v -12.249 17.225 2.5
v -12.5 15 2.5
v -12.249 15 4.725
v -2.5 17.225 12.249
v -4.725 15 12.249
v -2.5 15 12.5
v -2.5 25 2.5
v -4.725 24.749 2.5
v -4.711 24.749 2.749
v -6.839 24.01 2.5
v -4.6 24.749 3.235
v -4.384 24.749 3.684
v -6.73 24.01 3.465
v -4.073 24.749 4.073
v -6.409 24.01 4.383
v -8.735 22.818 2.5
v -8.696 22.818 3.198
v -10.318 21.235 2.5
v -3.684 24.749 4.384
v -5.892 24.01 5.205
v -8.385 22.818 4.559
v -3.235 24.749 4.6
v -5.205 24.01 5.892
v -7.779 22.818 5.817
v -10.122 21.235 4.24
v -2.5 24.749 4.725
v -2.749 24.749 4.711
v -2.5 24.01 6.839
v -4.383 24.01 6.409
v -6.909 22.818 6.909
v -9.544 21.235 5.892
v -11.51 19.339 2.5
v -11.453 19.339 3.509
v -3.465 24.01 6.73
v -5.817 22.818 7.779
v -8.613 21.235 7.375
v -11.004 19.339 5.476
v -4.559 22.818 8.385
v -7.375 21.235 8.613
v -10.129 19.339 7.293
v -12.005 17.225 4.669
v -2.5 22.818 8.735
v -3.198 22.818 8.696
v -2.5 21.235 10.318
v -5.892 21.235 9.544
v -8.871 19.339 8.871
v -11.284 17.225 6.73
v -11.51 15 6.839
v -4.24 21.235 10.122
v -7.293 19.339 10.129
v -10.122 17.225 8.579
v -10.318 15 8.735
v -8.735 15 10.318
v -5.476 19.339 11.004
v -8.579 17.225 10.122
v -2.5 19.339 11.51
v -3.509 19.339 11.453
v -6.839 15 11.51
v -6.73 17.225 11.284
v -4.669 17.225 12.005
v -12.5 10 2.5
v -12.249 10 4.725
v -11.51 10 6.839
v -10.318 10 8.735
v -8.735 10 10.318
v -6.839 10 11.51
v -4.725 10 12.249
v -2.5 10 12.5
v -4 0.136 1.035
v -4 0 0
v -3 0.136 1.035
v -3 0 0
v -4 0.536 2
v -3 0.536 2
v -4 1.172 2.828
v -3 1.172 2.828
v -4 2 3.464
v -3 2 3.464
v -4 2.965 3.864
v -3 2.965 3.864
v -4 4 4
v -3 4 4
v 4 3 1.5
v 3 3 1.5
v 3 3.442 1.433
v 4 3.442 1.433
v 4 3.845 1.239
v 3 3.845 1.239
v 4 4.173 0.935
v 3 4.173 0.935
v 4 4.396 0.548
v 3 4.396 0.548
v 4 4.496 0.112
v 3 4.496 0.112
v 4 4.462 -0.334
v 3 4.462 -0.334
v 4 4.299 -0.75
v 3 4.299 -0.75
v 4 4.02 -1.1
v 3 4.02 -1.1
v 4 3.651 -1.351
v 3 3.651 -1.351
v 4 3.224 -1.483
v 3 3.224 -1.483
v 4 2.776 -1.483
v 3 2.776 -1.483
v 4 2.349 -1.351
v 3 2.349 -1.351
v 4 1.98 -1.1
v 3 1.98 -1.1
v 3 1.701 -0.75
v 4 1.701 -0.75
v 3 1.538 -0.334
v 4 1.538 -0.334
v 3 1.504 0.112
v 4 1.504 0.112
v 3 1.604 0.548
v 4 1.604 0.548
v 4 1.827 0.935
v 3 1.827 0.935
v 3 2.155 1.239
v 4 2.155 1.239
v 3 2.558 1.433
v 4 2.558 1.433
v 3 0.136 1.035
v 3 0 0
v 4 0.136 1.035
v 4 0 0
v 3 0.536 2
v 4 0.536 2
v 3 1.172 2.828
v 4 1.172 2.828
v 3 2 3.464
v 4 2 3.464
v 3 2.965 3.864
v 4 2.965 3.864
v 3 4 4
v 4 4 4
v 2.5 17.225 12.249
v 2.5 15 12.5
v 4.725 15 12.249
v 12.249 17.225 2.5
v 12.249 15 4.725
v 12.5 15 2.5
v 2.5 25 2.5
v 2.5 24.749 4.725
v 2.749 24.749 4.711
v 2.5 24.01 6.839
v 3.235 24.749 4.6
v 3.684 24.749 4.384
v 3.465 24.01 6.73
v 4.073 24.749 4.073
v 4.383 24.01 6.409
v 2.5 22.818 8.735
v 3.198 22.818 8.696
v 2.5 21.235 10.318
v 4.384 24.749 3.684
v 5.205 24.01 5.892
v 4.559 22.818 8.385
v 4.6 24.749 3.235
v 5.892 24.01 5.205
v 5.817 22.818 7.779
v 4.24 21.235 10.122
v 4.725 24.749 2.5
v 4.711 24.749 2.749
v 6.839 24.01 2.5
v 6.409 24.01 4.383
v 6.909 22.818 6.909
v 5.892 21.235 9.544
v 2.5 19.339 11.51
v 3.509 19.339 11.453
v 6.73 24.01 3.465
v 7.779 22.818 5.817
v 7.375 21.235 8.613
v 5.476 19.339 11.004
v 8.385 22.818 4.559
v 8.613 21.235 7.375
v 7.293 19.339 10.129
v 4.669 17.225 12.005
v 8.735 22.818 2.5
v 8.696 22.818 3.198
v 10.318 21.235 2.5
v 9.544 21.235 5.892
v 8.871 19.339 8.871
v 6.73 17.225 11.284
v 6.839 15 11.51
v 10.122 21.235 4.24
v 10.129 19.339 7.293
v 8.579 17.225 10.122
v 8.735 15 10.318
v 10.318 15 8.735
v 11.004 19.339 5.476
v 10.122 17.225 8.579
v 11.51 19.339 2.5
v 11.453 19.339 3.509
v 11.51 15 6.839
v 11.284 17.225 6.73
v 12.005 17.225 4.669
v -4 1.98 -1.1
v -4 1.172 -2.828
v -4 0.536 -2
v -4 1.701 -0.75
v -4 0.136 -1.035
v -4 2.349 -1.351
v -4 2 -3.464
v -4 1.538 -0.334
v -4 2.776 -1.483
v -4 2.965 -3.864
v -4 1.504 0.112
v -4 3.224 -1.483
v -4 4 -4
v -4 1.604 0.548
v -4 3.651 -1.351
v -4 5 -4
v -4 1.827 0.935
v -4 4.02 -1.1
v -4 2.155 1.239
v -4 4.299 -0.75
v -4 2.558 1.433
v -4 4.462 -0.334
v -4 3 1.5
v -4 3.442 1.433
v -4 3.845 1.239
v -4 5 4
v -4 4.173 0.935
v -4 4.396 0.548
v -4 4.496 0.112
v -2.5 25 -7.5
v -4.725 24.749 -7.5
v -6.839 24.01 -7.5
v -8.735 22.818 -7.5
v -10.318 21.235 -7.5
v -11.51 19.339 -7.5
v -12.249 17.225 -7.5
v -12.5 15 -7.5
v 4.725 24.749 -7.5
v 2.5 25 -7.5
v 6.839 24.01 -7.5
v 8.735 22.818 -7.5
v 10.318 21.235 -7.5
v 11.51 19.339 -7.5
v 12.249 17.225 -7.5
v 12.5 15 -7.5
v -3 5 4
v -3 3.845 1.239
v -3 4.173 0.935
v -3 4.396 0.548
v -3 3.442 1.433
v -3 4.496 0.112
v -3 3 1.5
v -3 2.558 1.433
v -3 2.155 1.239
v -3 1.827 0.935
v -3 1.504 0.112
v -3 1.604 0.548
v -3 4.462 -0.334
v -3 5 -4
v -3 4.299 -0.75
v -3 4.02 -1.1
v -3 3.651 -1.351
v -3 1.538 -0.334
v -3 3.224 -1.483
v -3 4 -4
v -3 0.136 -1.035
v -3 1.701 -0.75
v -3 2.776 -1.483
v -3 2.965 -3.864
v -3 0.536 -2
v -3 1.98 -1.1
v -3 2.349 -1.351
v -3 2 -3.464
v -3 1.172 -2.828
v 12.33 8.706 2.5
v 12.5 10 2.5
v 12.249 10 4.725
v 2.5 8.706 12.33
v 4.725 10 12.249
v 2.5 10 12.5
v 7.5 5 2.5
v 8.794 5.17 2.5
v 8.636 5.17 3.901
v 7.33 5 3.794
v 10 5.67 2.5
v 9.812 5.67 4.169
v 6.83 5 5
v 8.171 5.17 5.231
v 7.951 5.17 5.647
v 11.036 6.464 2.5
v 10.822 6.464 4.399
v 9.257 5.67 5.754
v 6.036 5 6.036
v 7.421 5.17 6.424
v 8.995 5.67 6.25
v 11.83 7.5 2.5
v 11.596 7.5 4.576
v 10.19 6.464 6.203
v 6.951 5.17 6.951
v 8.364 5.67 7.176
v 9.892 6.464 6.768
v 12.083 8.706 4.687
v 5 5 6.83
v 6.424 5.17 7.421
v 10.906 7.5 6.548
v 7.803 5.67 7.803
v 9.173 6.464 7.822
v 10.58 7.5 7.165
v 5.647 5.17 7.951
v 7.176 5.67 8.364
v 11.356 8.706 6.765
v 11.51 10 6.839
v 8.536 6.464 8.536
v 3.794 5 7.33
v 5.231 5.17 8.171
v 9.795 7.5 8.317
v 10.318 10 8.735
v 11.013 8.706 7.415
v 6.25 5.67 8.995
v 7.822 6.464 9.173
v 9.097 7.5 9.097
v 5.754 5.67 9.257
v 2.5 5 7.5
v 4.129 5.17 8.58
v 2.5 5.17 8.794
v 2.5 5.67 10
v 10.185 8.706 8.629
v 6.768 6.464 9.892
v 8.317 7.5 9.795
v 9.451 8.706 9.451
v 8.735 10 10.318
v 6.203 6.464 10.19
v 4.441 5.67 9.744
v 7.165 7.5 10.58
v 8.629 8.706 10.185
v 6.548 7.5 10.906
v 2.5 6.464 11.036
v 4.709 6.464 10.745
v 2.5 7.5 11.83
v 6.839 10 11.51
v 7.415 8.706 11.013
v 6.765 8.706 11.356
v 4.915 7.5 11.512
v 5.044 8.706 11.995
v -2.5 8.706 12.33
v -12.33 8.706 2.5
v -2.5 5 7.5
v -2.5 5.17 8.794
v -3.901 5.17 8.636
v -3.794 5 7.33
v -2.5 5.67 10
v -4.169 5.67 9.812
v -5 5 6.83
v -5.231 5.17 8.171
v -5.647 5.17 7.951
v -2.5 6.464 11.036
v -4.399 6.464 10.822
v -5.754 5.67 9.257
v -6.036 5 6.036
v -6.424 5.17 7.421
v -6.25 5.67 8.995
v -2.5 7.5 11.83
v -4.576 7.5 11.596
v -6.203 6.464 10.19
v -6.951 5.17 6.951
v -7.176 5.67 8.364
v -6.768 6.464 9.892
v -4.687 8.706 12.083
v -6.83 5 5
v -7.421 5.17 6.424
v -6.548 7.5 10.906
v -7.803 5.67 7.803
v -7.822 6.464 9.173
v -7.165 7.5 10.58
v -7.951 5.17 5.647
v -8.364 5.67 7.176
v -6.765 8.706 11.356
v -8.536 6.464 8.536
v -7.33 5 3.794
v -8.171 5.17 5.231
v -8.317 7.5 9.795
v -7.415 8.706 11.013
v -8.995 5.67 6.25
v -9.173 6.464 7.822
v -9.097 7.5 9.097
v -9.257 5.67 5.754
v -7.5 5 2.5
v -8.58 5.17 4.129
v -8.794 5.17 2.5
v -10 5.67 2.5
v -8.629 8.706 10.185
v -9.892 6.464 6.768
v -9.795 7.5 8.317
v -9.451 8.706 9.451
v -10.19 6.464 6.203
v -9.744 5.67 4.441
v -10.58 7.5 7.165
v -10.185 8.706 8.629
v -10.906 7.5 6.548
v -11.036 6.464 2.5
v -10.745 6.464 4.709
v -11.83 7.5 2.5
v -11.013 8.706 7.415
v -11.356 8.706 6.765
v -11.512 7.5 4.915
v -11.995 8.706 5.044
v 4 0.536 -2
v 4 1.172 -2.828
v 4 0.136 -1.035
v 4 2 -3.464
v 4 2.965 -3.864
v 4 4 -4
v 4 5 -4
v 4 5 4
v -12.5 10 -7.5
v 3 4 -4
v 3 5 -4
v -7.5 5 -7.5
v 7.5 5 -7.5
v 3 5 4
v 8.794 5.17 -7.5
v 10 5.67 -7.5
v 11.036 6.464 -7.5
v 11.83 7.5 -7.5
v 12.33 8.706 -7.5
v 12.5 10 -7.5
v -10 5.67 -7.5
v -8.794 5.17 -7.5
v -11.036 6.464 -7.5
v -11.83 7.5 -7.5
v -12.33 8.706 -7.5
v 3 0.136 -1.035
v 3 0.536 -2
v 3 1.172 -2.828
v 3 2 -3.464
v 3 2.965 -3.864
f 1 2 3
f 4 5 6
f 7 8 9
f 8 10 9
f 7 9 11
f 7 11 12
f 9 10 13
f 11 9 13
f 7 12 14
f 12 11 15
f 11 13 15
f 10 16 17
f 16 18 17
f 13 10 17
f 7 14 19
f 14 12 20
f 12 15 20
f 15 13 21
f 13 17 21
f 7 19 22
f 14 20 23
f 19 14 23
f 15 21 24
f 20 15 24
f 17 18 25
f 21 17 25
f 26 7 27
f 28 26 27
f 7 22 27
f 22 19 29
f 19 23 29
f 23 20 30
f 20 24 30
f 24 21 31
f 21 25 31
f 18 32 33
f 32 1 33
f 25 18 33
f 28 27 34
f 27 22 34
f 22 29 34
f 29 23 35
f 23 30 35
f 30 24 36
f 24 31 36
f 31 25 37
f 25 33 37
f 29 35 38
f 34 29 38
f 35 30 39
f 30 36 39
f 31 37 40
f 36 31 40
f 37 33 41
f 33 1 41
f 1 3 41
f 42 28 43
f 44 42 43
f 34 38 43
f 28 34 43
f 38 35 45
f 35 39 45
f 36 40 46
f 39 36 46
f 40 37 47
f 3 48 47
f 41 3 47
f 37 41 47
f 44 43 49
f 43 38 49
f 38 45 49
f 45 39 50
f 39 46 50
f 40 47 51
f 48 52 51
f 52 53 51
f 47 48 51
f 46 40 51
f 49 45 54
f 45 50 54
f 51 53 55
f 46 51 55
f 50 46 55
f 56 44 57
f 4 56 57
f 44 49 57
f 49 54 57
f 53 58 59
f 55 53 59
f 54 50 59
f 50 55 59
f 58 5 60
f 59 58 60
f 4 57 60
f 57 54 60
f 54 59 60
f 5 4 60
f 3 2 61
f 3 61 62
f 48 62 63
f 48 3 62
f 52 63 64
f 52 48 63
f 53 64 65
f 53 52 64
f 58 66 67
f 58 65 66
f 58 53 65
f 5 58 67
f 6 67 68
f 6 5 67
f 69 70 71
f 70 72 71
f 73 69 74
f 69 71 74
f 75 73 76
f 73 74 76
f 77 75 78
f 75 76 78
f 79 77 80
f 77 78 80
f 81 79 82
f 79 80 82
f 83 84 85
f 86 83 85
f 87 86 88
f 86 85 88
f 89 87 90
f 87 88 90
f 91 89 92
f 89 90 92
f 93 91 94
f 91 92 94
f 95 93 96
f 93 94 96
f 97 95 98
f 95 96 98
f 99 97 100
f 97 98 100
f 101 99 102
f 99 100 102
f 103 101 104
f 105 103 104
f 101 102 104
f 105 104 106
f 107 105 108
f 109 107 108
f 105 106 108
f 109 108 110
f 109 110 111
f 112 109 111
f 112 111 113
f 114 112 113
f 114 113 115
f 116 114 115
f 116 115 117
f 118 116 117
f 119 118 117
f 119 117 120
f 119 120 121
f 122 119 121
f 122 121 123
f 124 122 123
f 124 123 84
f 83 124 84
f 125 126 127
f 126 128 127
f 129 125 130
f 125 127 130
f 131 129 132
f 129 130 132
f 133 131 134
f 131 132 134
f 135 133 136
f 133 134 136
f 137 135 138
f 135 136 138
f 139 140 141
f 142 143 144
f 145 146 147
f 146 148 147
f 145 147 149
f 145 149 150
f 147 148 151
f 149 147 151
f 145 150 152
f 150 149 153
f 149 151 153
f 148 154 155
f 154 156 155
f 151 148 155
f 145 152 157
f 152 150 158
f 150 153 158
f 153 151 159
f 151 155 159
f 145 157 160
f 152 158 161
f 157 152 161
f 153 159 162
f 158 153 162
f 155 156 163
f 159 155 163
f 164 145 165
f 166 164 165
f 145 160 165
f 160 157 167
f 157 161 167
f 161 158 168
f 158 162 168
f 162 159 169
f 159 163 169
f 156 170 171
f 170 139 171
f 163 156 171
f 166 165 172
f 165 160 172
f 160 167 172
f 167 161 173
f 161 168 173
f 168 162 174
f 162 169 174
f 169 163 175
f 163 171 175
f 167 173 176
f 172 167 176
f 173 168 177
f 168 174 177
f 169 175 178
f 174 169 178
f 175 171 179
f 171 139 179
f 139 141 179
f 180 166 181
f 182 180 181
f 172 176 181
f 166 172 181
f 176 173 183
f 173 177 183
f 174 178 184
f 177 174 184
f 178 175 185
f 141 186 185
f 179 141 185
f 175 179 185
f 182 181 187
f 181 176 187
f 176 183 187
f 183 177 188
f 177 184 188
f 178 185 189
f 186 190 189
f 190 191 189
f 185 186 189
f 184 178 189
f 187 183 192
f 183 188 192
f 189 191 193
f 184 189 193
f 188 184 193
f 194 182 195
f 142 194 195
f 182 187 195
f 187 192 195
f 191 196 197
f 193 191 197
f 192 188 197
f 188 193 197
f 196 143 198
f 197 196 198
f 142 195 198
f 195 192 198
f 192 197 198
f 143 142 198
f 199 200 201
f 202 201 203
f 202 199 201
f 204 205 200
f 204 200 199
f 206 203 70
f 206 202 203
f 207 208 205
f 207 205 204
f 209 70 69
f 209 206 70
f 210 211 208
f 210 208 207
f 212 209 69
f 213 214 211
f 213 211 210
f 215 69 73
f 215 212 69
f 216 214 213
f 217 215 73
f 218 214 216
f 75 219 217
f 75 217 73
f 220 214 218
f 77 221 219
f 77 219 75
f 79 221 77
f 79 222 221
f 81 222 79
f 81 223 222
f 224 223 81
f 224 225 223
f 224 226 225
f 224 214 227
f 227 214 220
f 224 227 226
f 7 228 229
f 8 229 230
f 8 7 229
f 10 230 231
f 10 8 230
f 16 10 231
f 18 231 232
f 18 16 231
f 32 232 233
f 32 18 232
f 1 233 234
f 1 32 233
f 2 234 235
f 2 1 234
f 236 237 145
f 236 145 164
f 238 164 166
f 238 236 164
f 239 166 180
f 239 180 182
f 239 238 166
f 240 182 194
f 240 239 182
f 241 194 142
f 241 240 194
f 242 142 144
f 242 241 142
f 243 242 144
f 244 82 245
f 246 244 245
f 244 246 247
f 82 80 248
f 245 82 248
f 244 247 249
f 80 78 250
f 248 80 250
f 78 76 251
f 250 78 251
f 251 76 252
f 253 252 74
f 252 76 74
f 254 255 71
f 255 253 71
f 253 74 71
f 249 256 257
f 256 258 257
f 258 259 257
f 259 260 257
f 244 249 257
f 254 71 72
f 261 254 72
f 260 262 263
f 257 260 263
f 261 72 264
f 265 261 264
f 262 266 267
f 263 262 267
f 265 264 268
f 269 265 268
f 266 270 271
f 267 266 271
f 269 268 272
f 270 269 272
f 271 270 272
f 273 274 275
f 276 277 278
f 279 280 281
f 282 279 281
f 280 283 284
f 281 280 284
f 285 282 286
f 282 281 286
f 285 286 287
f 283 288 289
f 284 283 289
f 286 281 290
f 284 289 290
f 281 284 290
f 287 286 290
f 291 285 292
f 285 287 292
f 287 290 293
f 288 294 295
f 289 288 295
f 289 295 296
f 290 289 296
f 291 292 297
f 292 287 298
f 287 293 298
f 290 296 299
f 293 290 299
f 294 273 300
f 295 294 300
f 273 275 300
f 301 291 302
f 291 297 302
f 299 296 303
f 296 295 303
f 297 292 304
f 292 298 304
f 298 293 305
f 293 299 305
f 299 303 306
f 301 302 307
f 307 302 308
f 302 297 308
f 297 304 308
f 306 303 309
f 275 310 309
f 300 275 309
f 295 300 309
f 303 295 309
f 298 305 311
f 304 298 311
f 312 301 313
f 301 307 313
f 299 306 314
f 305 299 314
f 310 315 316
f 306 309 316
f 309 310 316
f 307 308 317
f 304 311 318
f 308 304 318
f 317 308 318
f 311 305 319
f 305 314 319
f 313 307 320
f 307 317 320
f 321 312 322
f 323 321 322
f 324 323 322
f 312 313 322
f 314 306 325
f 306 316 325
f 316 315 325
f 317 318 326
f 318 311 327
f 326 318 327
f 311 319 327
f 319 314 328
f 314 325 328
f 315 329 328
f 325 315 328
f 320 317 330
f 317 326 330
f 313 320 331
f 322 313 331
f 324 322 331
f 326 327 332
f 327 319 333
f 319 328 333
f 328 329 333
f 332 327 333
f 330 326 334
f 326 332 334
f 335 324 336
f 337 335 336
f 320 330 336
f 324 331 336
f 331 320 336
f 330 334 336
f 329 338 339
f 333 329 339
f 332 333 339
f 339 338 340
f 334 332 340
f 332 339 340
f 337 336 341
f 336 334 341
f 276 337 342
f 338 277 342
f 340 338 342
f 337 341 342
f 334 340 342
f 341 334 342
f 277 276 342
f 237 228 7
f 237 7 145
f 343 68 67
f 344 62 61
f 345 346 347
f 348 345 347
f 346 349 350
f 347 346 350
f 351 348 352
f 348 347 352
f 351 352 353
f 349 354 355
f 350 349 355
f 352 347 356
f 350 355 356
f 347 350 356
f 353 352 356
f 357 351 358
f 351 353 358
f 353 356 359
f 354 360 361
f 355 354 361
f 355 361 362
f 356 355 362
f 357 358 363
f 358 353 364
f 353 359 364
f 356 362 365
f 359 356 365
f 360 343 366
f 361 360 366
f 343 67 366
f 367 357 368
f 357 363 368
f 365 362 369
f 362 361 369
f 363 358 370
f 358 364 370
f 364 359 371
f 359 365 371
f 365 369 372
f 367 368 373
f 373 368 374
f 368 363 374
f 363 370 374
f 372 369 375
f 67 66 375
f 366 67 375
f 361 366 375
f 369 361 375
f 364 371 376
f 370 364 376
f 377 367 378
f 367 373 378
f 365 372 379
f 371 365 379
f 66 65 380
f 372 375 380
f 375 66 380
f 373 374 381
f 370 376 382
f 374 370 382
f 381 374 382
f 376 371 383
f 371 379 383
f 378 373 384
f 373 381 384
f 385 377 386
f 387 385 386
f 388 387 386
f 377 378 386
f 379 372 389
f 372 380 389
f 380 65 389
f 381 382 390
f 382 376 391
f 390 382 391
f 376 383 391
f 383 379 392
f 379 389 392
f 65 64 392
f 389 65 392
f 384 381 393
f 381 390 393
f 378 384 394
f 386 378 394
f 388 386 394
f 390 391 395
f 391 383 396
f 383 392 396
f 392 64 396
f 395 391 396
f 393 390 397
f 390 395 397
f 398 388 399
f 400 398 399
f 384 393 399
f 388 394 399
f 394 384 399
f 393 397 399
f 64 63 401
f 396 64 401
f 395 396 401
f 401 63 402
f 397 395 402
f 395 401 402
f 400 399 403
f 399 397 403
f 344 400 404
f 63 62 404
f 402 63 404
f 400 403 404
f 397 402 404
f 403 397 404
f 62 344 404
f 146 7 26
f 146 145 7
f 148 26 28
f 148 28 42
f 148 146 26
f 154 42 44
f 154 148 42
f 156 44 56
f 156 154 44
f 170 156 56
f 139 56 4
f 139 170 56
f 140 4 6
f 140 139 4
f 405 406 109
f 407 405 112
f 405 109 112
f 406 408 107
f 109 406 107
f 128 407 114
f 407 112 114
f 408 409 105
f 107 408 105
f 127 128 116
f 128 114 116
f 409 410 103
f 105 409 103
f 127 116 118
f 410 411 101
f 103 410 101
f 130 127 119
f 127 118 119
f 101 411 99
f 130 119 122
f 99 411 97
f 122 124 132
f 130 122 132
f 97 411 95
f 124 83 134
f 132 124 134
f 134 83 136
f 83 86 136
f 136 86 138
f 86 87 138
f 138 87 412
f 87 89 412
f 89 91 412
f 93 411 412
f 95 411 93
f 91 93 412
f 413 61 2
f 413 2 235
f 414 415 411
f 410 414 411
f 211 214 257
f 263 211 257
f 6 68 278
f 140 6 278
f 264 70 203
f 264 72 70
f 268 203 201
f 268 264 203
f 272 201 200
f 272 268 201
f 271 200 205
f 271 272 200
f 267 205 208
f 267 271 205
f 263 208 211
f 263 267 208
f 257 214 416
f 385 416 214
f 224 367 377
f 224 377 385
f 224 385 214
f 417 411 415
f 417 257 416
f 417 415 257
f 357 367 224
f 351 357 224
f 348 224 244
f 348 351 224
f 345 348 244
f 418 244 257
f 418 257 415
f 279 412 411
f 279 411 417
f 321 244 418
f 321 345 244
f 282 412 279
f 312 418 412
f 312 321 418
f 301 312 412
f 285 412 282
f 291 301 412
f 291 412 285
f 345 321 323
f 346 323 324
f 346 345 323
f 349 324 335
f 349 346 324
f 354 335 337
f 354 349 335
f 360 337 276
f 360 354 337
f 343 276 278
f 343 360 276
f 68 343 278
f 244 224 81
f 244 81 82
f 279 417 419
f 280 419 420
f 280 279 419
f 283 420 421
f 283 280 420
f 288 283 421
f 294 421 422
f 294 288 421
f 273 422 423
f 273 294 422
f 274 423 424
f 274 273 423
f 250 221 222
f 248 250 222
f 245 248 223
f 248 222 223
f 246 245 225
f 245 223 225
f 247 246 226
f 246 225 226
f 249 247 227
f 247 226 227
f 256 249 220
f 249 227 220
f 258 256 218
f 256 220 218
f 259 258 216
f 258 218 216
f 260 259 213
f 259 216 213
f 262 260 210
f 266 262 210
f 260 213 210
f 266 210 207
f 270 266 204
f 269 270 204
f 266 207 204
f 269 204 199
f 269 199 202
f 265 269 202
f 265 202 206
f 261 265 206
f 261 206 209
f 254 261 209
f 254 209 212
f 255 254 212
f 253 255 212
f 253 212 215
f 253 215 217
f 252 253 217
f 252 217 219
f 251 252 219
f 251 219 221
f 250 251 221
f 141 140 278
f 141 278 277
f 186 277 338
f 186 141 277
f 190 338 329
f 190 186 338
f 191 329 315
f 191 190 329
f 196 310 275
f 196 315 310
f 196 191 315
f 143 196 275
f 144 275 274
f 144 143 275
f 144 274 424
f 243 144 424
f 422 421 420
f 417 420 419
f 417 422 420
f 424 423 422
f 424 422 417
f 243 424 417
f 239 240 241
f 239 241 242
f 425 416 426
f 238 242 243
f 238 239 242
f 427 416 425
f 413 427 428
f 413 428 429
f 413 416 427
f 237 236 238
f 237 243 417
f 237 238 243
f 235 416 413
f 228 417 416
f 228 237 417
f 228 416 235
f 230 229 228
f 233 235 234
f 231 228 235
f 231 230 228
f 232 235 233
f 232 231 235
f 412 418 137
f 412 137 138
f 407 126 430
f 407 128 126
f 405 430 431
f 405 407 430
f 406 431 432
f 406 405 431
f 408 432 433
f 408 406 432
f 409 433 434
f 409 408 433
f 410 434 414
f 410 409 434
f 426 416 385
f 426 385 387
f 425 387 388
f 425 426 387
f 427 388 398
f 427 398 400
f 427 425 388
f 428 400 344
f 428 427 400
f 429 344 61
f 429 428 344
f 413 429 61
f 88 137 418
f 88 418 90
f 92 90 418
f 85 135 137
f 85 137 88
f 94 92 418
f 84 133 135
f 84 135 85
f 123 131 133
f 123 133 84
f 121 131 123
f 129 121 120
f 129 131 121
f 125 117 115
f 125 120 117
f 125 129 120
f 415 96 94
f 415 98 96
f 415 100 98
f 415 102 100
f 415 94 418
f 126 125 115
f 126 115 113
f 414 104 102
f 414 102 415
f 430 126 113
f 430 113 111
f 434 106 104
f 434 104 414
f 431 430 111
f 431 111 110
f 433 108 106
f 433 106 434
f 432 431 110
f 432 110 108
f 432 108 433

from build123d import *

# Parameters (mm, degrees)
SKETCH2_W           = 25
SKETCH2_H           = 25
BOSS_EXTRUDE1_DEPTH = 25
FILLET2_R           = 10
FILLET3_R           = 10
CUT_EXTRUDE1_START  = -5
SKETCH3_W           = 8
SKETCH3_H           = 8
SKETCH3_W_2         = 6
SKETCH3_H_2         = 6
CUT_EXTRUDE1_DEPTH  = 5
FILLET5_R           = 5
CUT_EXTRUDE2_DEPTH  = 5
FILLET6_R           = 4
SKETCH6_R           = 1.5
CUT_EXTRUDE3_DEPTH  = 15
CUT_EXTRUDE4_DEPTH  = 5


with BuildPart() as part:
    # Sketch2 → Boss-Extrude1 (new body)
    with BuildSketch(Plane(origin=(0, 0, 0), x_dir=(1, 0, 0), z_dir=(0, 1, 0))):
        Rectangle(SKETCH2_W, SKETCH2_H)
    extrude(amount=BOSS_EXTRUDE1_DEPTH)

    # Fillet2
    fillet2_edges = [part.edges().sort_by_distance(p)[0] for p in [
        (12.5, 12.5, 12.5),
        (-12.5, 12.5, 12.5),
    ]]
    fillet(fillet2_edges, radius=FILLET2_R)

    # Fillet3
    fillet3_edges = [part.edges().sort_by_distance(p)[0] for p in [
        (0, 25, 12.5),
        (12.5, 25, -5),
        (9.571067812, 25, 9.571067812),
        (-9.571067812, 25, 9.571067812),
        (-12.5, 25, -5),
    ]]
    fillet(fillet3_edges, radius=FILLET3_R)

    # Sketch3 → Cut-Extrude1 (cut)
    # profile 1 of 2: a face of its own
    with BuildSketch(Plane.XZ.offset(CUT_EXTRUDE1_START)):
        with BuildLine():
            ThreePointArc((12.5, 2.5), (9.571067812, 9.571067812), (2.5, 12.5))
            Line((2.5, 12.5), (-2.5, 12.5))
            ThreePointArc((-2.5, 12.5), (-9.571067812, 9.571067812), (-12.5, 2.5))
            Line((-12.5, 2.5), (-12.5, -12.5))
            Line((-12.5, -12.5), (12.5, -12.5))
            Line((12.5, -12.5), (12.5, 2.5))
        make_face()
        Rectangle(SKETCH3_W, SKETCH3_H, mode=Mode.SUBTRACT)
    # profile 2 of 2: a face of its own
    with BuildSketch(Plane.XZ.offset(CUT_EXTRUDE1_START)):
        Rectangle(SKETCH3_W_2, SKETCH3_H_2)
    extrude(amount=CUT_EXTRUDE1_DEPTH, mode=Mode.SUBTRACT)

    # Fillet5
    fillet5_edges = [part.edges().sort_by_distance(p)[0] for p in [
        (9.571067812, 5, 9.571067812),
        (12.5, 5, -5),
        (-12.5, 5, -5),
        (-9.571067812, 5, 9.571067812),
        (0, 5, 12.5),
    ]]
    fillet(fillet5_edges, radius=FILLET5_R)

    # Sketch5 → Cut-Extrude2 (cut)
    with BuildSketch(Plane.XZ):
        Polygon((-3, 3), (-3, 4.768124317), (3, 4.768124317), (3, -4.905831879), (-3, -4.905831879), align=None)
    extrude(amount=-CUT_EXTRUDE2_DEPTH, mode=Mode.SUBTRACT)

    # Fillet6
    fillet6_edges = [part.edges().sort_by_distance(p)[0] for p in [
        (3.5, 0, -4),
        (3.5, 0, 4),
        (-3.5, 0, -4),
        (-3.5, 0, 4),
    ]]
    fillet(fillet6_edges, radius=FILLET6_R - 0.0001)  # a hair under: the kernel refuses the full size

    # Sketch6 → Cut-Extrude3 (cut)
    with BuildSketch(Plane.ZY.offset(4)):
        with Locations((0, 3)):
            Circle(SKETCH6_R)
    extrude(amount=-CUT_EXTRUDE3_DEPTH, mode=Mode.SUBTRACT)

    # Sketch7 → Cut-Extrude4 (cut)
    with BuildSketch(Plane(origin=(0, 0, -12.5), x_dir=(-1, 0, 0), z_dir=(0, 0, -1))):
        with BuildLine():
            Line((-12.5, 15), (-12.5, 10))
            ThreePointArc((-12.5, 10), (-11.035533906, 6.464466094), (-7.5, 5))
            Line((-7.5, 5), (7.5, 5))
            ThreePointArc((7.5, 5), (11.035533906, 6.464466094), (12.5, 10))
            Line((12.5, 10), (12.5, 15))
            ThreePointArc((12.5, 15), (9.571067812, 22.071067812), (2.5, 25))
            Line((2.5, 25), (-2.5, 25))
            ThreePointArc((-2.5, 25), (-9.571067812, 22.071067812), (-12.5, 15))
        make_face()
    extrude(amount=-CUT_EXTRUDE4_DEPTH, mode=Mode.SUBTRACT)


solid = part.part
